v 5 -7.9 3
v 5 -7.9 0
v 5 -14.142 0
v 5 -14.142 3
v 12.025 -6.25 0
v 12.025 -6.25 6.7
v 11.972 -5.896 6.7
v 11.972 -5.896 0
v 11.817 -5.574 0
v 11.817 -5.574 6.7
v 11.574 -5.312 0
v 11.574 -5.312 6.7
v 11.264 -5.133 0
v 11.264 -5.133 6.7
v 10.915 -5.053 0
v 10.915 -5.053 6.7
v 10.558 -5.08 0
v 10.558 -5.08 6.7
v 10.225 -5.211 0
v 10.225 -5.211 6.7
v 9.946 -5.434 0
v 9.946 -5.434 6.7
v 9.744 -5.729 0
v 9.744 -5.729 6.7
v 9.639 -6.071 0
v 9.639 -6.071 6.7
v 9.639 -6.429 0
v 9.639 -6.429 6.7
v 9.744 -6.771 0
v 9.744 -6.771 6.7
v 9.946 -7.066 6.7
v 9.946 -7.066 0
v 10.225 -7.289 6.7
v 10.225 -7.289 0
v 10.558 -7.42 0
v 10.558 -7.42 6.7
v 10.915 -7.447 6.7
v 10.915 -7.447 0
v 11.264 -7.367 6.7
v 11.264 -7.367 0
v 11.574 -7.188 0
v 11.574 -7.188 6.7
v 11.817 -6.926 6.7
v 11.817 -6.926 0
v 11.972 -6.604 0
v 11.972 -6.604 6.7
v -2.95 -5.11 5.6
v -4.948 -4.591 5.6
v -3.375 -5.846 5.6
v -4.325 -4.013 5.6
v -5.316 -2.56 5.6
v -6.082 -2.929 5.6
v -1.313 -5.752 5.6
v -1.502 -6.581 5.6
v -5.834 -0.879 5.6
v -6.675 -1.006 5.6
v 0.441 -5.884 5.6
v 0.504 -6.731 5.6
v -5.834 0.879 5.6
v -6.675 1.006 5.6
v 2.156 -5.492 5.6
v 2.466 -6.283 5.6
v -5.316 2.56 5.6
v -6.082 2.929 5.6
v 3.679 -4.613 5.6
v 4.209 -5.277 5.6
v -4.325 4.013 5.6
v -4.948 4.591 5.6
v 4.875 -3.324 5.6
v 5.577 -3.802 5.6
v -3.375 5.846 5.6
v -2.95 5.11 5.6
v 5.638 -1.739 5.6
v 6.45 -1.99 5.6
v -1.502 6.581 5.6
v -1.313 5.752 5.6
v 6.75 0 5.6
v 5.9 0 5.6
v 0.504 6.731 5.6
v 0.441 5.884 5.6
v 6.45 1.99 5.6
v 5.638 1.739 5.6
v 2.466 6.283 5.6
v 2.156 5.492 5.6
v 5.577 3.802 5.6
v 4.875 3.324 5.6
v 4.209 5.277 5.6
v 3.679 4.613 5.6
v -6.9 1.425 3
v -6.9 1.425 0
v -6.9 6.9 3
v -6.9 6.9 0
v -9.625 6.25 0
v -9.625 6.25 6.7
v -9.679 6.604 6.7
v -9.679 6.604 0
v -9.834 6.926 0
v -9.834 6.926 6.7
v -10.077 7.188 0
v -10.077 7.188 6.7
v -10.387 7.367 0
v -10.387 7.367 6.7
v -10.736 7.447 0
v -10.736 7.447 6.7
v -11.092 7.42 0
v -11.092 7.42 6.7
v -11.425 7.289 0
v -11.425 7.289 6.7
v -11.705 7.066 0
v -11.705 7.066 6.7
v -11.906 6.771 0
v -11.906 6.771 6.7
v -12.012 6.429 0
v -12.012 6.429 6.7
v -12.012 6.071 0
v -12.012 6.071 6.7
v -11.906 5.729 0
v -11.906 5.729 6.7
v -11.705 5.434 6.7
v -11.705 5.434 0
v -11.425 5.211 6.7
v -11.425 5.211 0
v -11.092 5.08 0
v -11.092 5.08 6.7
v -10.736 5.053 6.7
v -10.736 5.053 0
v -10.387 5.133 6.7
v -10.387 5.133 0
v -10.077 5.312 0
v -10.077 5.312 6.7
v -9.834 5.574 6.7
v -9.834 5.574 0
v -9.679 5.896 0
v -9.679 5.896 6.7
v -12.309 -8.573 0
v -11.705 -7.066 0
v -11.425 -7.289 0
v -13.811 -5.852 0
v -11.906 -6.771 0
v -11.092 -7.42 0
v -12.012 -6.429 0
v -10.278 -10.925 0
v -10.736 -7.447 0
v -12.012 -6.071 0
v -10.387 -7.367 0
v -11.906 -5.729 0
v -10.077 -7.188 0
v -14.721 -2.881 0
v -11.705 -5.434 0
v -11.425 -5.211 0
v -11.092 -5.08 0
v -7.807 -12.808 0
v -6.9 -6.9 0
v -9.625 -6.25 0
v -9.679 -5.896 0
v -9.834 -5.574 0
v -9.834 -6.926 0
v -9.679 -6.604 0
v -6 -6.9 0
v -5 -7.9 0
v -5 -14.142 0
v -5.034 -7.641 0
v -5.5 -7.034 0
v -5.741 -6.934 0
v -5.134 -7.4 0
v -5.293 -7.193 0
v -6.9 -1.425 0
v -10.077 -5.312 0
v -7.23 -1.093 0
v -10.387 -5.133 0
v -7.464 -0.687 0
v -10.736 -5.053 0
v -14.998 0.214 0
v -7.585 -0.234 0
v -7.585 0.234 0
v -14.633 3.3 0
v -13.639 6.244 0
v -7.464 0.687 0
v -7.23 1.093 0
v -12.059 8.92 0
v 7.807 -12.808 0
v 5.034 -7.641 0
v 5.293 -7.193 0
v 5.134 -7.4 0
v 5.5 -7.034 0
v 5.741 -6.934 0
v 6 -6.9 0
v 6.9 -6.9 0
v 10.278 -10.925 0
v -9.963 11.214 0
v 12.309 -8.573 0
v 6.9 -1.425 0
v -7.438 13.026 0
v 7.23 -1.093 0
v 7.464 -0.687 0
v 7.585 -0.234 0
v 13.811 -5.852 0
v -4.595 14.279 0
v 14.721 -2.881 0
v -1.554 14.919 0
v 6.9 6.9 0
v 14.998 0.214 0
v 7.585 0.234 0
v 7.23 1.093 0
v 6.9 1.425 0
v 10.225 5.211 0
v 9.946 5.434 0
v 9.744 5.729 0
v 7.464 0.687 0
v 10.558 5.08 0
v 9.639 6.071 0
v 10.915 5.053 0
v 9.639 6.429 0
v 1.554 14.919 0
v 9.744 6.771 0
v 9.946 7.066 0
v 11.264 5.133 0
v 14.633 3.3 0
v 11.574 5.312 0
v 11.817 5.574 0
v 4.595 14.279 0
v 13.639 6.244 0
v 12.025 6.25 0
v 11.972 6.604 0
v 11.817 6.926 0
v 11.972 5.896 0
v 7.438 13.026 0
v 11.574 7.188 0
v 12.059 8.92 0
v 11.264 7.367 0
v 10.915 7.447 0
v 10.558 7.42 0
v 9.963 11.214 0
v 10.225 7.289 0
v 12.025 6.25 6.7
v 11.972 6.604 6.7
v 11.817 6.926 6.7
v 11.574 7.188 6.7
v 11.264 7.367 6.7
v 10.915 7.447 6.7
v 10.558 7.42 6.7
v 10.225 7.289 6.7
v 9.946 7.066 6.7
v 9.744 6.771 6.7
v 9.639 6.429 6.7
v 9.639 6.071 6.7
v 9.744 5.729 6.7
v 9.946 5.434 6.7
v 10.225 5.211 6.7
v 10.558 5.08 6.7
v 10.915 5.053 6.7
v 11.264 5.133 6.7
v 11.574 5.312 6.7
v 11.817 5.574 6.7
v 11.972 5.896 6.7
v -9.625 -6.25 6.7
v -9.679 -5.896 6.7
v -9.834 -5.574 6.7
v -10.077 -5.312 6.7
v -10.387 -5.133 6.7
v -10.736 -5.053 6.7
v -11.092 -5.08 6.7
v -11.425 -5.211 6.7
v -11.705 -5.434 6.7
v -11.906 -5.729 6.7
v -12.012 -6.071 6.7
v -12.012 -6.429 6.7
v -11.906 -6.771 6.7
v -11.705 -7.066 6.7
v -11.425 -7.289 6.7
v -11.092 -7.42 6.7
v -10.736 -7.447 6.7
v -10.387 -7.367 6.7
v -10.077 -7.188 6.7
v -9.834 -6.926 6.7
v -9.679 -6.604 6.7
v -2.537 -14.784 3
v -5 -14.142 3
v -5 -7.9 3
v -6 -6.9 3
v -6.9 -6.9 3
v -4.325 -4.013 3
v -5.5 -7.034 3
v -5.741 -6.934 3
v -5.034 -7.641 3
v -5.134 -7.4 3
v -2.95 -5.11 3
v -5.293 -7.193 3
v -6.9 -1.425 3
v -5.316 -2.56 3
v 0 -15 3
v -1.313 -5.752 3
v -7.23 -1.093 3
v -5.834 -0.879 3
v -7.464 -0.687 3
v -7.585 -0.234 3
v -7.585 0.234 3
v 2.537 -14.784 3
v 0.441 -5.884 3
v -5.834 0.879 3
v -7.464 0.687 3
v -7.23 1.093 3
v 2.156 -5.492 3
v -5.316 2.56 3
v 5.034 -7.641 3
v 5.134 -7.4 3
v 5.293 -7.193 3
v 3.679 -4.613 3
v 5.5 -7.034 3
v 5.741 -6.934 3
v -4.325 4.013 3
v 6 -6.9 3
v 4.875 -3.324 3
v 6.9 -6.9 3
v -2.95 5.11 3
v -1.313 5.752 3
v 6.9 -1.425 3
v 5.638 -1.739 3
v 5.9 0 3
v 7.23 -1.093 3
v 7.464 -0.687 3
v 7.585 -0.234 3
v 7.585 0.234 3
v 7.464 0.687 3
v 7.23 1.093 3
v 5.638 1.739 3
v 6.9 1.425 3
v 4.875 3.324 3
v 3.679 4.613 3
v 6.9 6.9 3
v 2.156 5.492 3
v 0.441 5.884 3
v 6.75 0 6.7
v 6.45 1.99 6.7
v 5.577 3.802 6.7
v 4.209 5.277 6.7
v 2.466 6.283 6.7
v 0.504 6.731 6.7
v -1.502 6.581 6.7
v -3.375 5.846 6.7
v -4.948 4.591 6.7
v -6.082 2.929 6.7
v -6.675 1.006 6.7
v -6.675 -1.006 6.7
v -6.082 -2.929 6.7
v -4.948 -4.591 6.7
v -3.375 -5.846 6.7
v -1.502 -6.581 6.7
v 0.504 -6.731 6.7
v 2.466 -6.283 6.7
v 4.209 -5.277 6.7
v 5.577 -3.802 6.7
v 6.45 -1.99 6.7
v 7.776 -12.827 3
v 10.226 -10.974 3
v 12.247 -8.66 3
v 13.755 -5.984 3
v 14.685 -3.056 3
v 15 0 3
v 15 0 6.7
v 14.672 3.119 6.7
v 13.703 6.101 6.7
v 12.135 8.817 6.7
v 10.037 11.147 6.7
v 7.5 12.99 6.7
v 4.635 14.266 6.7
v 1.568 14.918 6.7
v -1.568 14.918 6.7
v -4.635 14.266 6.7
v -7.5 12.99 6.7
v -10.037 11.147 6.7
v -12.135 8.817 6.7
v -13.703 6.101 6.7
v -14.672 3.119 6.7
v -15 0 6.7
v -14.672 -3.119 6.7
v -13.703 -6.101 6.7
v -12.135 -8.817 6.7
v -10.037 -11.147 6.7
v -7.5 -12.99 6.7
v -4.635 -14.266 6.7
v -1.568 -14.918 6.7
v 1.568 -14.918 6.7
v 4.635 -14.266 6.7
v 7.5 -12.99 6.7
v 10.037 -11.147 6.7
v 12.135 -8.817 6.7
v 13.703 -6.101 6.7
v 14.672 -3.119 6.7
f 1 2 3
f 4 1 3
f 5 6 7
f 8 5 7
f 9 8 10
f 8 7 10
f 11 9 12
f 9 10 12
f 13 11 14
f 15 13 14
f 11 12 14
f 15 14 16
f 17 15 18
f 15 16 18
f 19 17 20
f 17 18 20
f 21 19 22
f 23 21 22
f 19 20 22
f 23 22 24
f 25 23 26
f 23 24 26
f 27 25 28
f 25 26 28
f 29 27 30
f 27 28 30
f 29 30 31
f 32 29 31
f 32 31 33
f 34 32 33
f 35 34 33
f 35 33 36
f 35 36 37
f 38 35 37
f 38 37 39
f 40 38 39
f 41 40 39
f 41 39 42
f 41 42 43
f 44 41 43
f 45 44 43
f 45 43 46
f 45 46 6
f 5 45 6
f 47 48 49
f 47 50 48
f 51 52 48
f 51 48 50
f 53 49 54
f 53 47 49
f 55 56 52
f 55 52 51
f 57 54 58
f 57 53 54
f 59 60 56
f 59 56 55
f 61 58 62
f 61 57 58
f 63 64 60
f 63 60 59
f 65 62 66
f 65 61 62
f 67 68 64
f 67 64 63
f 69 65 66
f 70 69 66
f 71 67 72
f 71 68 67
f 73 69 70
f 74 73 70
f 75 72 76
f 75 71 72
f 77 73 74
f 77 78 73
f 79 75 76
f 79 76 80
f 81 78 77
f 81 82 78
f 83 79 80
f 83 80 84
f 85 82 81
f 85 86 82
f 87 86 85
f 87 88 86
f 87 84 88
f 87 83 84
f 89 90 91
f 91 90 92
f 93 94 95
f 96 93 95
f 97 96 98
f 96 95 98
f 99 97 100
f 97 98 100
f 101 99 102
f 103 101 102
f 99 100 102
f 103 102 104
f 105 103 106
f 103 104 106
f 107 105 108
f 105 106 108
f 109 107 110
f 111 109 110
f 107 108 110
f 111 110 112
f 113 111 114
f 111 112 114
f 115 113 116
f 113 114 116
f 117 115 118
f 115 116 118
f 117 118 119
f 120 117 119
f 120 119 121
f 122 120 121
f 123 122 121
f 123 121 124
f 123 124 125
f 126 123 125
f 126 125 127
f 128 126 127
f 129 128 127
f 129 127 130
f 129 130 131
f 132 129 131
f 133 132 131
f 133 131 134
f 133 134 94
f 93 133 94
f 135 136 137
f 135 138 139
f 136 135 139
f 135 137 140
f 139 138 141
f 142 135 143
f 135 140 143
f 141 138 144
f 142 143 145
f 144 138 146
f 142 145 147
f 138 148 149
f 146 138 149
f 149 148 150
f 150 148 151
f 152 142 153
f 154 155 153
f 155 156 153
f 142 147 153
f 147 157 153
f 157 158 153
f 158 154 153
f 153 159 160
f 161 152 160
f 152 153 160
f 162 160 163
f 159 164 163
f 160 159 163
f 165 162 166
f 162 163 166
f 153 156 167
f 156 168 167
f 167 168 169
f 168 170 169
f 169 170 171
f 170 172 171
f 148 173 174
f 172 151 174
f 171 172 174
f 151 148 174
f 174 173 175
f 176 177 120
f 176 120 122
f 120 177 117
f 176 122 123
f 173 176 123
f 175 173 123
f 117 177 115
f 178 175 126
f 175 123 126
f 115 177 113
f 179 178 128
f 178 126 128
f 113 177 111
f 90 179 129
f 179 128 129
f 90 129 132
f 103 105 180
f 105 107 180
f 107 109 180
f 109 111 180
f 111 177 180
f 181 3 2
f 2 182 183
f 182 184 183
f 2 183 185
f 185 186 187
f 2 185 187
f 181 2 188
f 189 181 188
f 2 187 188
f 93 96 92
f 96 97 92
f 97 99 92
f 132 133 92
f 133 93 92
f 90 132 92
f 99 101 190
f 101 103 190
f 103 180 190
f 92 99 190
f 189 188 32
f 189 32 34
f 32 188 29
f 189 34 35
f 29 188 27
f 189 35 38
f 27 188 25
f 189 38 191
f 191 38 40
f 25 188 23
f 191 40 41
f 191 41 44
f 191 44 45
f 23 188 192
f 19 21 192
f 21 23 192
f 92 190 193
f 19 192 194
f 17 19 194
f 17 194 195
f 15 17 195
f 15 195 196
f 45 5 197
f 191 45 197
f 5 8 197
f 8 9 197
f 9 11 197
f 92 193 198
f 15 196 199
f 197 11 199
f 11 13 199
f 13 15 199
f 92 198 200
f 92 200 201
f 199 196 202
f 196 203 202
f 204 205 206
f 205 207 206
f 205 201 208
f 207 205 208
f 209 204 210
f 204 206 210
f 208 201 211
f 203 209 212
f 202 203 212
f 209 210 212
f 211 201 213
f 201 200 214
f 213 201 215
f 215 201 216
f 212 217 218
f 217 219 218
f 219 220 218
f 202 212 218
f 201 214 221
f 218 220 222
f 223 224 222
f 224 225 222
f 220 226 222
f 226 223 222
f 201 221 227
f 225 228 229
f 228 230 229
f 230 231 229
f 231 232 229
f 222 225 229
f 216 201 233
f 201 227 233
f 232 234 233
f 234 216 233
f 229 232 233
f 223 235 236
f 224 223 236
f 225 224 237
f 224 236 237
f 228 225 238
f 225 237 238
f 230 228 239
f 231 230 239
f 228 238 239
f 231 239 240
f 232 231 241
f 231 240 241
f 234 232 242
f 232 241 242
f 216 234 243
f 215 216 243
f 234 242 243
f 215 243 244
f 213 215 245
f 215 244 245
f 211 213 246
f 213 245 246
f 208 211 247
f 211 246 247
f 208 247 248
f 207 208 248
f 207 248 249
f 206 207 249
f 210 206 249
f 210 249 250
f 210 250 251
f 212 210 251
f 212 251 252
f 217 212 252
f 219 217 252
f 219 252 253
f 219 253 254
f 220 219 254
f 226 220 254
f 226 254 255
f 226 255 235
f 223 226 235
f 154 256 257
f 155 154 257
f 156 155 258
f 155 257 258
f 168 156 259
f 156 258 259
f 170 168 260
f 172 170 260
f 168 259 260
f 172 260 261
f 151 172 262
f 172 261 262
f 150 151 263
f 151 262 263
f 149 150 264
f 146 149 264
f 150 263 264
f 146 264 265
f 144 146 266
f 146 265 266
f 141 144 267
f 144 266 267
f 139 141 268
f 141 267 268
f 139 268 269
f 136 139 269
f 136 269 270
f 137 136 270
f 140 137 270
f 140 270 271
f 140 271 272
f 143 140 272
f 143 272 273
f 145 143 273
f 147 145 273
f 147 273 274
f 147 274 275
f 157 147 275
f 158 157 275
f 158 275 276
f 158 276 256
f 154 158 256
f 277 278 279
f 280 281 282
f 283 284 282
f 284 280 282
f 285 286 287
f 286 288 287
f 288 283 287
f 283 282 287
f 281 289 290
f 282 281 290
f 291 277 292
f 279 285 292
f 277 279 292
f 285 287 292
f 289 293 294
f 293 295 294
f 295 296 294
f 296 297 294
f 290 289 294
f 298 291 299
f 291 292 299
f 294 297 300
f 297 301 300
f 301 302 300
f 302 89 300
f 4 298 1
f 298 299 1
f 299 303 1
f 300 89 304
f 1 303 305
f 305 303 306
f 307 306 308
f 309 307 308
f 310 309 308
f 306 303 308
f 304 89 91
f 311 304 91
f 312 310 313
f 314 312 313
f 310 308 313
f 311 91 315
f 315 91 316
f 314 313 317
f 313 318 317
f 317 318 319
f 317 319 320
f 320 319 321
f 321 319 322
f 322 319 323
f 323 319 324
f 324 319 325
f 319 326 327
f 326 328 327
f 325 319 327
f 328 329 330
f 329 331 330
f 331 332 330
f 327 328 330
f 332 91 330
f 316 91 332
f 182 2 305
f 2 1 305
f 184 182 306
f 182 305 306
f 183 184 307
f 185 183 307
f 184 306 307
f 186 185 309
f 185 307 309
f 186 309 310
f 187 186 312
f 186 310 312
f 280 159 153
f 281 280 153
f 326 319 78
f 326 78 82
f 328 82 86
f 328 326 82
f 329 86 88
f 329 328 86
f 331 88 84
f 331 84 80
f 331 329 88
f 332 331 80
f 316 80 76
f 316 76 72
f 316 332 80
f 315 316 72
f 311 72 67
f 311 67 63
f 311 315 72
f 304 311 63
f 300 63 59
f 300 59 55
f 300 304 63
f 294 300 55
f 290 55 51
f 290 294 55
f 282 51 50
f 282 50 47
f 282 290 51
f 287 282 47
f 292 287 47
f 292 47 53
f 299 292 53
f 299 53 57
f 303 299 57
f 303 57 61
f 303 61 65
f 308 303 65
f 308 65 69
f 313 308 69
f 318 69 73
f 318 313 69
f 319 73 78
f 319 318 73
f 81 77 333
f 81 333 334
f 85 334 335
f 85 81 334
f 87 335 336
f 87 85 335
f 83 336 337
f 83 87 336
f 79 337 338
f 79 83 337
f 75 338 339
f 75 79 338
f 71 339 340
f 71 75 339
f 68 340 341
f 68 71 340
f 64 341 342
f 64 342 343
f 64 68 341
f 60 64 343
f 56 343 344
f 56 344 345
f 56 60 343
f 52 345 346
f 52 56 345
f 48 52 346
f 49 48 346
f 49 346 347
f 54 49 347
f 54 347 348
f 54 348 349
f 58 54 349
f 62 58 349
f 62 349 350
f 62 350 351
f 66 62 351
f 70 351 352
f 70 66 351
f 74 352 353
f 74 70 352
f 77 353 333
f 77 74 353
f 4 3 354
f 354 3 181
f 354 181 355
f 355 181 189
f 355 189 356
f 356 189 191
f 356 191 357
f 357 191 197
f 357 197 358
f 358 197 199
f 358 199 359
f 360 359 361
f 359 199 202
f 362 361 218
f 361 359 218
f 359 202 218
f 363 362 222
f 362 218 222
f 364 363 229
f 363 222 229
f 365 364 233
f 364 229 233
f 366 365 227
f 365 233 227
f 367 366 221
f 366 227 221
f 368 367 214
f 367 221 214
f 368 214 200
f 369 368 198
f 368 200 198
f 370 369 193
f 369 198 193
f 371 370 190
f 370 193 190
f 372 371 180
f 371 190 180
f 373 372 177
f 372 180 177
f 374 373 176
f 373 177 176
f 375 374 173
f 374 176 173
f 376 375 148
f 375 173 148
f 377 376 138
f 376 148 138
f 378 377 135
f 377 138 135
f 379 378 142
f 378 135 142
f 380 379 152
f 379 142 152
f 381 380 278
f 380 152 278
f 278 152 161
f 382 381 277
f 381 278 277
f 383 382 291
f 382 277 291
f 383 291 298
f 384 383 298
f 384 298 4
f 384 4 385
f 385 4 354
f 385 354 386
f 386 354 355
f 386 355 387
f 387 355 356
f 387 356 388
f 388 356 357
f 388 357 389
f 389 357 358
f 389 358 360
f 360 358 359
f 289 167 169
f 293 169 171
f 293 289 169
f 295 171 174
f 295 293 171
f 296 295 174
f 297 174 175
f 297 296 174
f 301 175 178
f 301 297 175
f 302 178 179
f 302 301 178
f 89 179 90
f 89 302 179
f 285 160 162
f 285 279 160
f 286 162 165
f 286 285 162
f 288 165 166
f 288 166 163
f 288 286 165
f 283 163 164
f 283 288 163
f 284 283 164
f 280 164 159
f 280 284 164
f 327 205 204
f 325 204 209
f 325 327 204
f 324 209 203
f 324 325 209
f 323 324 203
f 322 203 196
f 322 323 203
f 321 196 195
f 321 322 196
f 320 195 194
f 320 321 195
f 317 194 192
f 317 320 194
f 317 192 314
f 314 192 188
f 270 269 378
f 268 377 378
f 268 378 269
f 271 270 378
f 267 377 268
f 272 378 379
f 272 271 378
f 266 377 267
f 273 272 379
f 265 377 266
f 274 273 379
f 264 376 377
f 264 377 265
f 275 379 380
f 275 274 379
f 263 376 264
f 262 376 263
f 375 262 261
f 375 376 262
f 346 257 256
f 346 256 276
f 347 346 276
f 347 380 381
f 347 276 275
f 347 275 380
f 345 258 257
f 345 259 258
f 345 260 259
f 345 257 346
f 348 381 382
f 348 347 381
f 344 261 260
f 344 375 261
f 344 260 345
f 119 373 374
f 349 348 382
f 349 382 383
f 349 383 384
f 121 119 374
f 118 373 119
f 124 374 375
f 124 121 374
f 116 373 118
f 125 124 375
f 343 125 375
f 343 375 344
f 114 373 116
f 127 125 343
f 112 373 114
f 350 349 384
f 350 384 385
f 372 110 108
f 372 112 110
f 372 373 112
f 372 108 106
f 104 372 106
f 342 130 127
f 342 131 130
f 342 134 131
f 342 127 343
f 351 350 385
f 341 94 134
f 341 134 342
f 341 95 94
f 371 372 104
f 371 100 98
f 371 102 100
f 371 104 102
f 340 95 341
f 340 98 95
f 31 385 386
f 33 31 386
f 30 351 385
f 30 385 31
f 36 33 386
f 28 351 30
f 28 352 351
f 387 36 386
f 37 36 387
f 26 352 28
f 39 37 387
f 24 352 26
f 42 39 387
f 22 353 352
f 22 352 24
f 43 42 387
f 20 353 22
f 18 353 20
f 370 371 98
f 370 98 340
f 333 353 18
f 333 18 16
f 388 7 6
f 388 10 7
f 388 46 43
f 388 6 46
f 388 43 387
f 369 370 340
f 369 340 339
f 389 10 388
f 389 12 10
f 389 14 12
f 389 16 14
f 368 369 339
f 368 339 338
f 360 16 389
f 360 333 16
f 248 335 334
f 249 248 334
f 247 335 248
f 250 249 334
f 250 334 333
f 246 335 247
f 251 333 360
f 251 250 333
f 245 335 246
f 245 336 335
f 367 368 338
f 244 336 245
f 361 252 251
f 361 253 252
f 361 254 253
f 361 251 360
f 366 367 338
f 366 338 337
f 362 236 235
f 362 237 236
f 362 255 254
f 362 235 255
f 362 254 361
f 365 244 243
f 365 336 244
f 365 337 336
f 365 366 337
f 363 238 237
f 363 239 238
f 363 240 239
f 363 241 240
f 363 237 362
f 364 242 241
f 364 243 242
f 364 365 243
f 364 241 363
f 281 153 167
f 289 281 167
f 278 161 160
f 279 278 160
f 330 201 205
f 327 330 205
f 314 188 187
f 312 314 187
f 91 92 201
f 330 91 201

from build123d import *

# Parameters (mm, degrees)
EXTRUDE_1_DEPTH     = 3
CUT_EXTRUDE_4_DEPTH = 4
SKETCH_12_R         = 15
SKETCH_12_R_2       = 5.9
EXTRUDE_2_DEPTH     = 2.6
SKETCH_13_R         = 15
SKETCH_13_R_2       = 6.75
EXTRUDE_3_DEPTH     = 1.1
SKETCH_14_R         = 1.2
CUT_EXTRUDE_5_DEPTH = 7.7
FILLET_1_R          = 1


with BuildPart() as part:
    # 스케치1 → 보스-돌출1 (new body)
    with BuildSketch(Plane.XY):
        with BuildLine():
            Line((-5, -6.9), (-6.9, -6.9))
            Line((-6.9, -6.9), (-6.9, 6.9))
            Line((-6.9, 6.9), (6.9, 6.9))
            Line((6.9, 6.9), (6.9, -6.9))
            Line((6.9, -6.9), (5, -6.9))
            Line((5, -6.9), (5, -14.142135624))
            ThreePointArc((5, -14.142135624), (0, 15), (-5, -14.142135624))
            Line((-5, -14.142135624), (-5, -6.9))
        make_face()
    extrude(amount=EXTRUDE_1_DEPTH)

    # 스케치11 → 컷-돌출4 (cut, through all)
    with BuildSketch(Plane.XY.offset(3)):
        with BuildLine():
            Line((5.8, -1.8), (-5.8, -1.8))
            ThreePointArc((-5.8, -1.8), (-7.6, 0), (-5.8, 1.8))
            Line((-5.8, 1.8), (5.8, 1.8))
            ThreePointArc((5.8, 1.8), (7.6, 0), (5.8, -1.8))
        make_face()
    extrude(amount=-CUT_EXTRUDE_4_DEPTH, mode=Mode.SUBTRACT)

    # 스케치12 → 보스-돌출2 (add)
    with BuildSketch(Plane.XY.offset(3)):
        Circle(SKETCH_12_R)
        Circle(SKETCH_12_R_2, mode=Mode.SUBTRACT)
    extrude(amount=EXTRUDE_2_DEPTH)

    # 스케치13 → 보스-돌출3 (add)
    with BuildSketch(Plane.XY.offset(5.6)):
        Circle(SKETCH_13_R)
        Circle(SKETCH_13_R_2, mode=Mode.SUBTRACT)
    extrude(amount=EXTRUDE_3_DEPTH)

    # 스케치14 → 컷-돌출5 (cut, through all)
    with BuildSketch(Plane.XY.offset(6.7)):
        with Locations((10.825317547, 6.25)):
            Circle(SKETCH_14_R)
        with Locations((-10.825317547, 6.25)):
            Circle(SKETCH_14_R)
        with Locations((10.825317547, -6.25)):
            Circle(SKETCH_14_R)
        with Locations((-10.825317547, -6.25)):
            Circle(SKETCH_14_R)
    extrude(amount=-CUT_EXTRUDE_5_DEPTH, mode=Mode.SUBTRACT)

    # 필렛1
    fillet_1_edges = [part.edges().sort_by_distance(p)[0] for p in [
        (-5, -6.9, 1.5),
        (5, -6.9, 1.5),
    ]]
    fillet(fillet_1_edges, radius=FILLET_1_R)


solid = part.part
